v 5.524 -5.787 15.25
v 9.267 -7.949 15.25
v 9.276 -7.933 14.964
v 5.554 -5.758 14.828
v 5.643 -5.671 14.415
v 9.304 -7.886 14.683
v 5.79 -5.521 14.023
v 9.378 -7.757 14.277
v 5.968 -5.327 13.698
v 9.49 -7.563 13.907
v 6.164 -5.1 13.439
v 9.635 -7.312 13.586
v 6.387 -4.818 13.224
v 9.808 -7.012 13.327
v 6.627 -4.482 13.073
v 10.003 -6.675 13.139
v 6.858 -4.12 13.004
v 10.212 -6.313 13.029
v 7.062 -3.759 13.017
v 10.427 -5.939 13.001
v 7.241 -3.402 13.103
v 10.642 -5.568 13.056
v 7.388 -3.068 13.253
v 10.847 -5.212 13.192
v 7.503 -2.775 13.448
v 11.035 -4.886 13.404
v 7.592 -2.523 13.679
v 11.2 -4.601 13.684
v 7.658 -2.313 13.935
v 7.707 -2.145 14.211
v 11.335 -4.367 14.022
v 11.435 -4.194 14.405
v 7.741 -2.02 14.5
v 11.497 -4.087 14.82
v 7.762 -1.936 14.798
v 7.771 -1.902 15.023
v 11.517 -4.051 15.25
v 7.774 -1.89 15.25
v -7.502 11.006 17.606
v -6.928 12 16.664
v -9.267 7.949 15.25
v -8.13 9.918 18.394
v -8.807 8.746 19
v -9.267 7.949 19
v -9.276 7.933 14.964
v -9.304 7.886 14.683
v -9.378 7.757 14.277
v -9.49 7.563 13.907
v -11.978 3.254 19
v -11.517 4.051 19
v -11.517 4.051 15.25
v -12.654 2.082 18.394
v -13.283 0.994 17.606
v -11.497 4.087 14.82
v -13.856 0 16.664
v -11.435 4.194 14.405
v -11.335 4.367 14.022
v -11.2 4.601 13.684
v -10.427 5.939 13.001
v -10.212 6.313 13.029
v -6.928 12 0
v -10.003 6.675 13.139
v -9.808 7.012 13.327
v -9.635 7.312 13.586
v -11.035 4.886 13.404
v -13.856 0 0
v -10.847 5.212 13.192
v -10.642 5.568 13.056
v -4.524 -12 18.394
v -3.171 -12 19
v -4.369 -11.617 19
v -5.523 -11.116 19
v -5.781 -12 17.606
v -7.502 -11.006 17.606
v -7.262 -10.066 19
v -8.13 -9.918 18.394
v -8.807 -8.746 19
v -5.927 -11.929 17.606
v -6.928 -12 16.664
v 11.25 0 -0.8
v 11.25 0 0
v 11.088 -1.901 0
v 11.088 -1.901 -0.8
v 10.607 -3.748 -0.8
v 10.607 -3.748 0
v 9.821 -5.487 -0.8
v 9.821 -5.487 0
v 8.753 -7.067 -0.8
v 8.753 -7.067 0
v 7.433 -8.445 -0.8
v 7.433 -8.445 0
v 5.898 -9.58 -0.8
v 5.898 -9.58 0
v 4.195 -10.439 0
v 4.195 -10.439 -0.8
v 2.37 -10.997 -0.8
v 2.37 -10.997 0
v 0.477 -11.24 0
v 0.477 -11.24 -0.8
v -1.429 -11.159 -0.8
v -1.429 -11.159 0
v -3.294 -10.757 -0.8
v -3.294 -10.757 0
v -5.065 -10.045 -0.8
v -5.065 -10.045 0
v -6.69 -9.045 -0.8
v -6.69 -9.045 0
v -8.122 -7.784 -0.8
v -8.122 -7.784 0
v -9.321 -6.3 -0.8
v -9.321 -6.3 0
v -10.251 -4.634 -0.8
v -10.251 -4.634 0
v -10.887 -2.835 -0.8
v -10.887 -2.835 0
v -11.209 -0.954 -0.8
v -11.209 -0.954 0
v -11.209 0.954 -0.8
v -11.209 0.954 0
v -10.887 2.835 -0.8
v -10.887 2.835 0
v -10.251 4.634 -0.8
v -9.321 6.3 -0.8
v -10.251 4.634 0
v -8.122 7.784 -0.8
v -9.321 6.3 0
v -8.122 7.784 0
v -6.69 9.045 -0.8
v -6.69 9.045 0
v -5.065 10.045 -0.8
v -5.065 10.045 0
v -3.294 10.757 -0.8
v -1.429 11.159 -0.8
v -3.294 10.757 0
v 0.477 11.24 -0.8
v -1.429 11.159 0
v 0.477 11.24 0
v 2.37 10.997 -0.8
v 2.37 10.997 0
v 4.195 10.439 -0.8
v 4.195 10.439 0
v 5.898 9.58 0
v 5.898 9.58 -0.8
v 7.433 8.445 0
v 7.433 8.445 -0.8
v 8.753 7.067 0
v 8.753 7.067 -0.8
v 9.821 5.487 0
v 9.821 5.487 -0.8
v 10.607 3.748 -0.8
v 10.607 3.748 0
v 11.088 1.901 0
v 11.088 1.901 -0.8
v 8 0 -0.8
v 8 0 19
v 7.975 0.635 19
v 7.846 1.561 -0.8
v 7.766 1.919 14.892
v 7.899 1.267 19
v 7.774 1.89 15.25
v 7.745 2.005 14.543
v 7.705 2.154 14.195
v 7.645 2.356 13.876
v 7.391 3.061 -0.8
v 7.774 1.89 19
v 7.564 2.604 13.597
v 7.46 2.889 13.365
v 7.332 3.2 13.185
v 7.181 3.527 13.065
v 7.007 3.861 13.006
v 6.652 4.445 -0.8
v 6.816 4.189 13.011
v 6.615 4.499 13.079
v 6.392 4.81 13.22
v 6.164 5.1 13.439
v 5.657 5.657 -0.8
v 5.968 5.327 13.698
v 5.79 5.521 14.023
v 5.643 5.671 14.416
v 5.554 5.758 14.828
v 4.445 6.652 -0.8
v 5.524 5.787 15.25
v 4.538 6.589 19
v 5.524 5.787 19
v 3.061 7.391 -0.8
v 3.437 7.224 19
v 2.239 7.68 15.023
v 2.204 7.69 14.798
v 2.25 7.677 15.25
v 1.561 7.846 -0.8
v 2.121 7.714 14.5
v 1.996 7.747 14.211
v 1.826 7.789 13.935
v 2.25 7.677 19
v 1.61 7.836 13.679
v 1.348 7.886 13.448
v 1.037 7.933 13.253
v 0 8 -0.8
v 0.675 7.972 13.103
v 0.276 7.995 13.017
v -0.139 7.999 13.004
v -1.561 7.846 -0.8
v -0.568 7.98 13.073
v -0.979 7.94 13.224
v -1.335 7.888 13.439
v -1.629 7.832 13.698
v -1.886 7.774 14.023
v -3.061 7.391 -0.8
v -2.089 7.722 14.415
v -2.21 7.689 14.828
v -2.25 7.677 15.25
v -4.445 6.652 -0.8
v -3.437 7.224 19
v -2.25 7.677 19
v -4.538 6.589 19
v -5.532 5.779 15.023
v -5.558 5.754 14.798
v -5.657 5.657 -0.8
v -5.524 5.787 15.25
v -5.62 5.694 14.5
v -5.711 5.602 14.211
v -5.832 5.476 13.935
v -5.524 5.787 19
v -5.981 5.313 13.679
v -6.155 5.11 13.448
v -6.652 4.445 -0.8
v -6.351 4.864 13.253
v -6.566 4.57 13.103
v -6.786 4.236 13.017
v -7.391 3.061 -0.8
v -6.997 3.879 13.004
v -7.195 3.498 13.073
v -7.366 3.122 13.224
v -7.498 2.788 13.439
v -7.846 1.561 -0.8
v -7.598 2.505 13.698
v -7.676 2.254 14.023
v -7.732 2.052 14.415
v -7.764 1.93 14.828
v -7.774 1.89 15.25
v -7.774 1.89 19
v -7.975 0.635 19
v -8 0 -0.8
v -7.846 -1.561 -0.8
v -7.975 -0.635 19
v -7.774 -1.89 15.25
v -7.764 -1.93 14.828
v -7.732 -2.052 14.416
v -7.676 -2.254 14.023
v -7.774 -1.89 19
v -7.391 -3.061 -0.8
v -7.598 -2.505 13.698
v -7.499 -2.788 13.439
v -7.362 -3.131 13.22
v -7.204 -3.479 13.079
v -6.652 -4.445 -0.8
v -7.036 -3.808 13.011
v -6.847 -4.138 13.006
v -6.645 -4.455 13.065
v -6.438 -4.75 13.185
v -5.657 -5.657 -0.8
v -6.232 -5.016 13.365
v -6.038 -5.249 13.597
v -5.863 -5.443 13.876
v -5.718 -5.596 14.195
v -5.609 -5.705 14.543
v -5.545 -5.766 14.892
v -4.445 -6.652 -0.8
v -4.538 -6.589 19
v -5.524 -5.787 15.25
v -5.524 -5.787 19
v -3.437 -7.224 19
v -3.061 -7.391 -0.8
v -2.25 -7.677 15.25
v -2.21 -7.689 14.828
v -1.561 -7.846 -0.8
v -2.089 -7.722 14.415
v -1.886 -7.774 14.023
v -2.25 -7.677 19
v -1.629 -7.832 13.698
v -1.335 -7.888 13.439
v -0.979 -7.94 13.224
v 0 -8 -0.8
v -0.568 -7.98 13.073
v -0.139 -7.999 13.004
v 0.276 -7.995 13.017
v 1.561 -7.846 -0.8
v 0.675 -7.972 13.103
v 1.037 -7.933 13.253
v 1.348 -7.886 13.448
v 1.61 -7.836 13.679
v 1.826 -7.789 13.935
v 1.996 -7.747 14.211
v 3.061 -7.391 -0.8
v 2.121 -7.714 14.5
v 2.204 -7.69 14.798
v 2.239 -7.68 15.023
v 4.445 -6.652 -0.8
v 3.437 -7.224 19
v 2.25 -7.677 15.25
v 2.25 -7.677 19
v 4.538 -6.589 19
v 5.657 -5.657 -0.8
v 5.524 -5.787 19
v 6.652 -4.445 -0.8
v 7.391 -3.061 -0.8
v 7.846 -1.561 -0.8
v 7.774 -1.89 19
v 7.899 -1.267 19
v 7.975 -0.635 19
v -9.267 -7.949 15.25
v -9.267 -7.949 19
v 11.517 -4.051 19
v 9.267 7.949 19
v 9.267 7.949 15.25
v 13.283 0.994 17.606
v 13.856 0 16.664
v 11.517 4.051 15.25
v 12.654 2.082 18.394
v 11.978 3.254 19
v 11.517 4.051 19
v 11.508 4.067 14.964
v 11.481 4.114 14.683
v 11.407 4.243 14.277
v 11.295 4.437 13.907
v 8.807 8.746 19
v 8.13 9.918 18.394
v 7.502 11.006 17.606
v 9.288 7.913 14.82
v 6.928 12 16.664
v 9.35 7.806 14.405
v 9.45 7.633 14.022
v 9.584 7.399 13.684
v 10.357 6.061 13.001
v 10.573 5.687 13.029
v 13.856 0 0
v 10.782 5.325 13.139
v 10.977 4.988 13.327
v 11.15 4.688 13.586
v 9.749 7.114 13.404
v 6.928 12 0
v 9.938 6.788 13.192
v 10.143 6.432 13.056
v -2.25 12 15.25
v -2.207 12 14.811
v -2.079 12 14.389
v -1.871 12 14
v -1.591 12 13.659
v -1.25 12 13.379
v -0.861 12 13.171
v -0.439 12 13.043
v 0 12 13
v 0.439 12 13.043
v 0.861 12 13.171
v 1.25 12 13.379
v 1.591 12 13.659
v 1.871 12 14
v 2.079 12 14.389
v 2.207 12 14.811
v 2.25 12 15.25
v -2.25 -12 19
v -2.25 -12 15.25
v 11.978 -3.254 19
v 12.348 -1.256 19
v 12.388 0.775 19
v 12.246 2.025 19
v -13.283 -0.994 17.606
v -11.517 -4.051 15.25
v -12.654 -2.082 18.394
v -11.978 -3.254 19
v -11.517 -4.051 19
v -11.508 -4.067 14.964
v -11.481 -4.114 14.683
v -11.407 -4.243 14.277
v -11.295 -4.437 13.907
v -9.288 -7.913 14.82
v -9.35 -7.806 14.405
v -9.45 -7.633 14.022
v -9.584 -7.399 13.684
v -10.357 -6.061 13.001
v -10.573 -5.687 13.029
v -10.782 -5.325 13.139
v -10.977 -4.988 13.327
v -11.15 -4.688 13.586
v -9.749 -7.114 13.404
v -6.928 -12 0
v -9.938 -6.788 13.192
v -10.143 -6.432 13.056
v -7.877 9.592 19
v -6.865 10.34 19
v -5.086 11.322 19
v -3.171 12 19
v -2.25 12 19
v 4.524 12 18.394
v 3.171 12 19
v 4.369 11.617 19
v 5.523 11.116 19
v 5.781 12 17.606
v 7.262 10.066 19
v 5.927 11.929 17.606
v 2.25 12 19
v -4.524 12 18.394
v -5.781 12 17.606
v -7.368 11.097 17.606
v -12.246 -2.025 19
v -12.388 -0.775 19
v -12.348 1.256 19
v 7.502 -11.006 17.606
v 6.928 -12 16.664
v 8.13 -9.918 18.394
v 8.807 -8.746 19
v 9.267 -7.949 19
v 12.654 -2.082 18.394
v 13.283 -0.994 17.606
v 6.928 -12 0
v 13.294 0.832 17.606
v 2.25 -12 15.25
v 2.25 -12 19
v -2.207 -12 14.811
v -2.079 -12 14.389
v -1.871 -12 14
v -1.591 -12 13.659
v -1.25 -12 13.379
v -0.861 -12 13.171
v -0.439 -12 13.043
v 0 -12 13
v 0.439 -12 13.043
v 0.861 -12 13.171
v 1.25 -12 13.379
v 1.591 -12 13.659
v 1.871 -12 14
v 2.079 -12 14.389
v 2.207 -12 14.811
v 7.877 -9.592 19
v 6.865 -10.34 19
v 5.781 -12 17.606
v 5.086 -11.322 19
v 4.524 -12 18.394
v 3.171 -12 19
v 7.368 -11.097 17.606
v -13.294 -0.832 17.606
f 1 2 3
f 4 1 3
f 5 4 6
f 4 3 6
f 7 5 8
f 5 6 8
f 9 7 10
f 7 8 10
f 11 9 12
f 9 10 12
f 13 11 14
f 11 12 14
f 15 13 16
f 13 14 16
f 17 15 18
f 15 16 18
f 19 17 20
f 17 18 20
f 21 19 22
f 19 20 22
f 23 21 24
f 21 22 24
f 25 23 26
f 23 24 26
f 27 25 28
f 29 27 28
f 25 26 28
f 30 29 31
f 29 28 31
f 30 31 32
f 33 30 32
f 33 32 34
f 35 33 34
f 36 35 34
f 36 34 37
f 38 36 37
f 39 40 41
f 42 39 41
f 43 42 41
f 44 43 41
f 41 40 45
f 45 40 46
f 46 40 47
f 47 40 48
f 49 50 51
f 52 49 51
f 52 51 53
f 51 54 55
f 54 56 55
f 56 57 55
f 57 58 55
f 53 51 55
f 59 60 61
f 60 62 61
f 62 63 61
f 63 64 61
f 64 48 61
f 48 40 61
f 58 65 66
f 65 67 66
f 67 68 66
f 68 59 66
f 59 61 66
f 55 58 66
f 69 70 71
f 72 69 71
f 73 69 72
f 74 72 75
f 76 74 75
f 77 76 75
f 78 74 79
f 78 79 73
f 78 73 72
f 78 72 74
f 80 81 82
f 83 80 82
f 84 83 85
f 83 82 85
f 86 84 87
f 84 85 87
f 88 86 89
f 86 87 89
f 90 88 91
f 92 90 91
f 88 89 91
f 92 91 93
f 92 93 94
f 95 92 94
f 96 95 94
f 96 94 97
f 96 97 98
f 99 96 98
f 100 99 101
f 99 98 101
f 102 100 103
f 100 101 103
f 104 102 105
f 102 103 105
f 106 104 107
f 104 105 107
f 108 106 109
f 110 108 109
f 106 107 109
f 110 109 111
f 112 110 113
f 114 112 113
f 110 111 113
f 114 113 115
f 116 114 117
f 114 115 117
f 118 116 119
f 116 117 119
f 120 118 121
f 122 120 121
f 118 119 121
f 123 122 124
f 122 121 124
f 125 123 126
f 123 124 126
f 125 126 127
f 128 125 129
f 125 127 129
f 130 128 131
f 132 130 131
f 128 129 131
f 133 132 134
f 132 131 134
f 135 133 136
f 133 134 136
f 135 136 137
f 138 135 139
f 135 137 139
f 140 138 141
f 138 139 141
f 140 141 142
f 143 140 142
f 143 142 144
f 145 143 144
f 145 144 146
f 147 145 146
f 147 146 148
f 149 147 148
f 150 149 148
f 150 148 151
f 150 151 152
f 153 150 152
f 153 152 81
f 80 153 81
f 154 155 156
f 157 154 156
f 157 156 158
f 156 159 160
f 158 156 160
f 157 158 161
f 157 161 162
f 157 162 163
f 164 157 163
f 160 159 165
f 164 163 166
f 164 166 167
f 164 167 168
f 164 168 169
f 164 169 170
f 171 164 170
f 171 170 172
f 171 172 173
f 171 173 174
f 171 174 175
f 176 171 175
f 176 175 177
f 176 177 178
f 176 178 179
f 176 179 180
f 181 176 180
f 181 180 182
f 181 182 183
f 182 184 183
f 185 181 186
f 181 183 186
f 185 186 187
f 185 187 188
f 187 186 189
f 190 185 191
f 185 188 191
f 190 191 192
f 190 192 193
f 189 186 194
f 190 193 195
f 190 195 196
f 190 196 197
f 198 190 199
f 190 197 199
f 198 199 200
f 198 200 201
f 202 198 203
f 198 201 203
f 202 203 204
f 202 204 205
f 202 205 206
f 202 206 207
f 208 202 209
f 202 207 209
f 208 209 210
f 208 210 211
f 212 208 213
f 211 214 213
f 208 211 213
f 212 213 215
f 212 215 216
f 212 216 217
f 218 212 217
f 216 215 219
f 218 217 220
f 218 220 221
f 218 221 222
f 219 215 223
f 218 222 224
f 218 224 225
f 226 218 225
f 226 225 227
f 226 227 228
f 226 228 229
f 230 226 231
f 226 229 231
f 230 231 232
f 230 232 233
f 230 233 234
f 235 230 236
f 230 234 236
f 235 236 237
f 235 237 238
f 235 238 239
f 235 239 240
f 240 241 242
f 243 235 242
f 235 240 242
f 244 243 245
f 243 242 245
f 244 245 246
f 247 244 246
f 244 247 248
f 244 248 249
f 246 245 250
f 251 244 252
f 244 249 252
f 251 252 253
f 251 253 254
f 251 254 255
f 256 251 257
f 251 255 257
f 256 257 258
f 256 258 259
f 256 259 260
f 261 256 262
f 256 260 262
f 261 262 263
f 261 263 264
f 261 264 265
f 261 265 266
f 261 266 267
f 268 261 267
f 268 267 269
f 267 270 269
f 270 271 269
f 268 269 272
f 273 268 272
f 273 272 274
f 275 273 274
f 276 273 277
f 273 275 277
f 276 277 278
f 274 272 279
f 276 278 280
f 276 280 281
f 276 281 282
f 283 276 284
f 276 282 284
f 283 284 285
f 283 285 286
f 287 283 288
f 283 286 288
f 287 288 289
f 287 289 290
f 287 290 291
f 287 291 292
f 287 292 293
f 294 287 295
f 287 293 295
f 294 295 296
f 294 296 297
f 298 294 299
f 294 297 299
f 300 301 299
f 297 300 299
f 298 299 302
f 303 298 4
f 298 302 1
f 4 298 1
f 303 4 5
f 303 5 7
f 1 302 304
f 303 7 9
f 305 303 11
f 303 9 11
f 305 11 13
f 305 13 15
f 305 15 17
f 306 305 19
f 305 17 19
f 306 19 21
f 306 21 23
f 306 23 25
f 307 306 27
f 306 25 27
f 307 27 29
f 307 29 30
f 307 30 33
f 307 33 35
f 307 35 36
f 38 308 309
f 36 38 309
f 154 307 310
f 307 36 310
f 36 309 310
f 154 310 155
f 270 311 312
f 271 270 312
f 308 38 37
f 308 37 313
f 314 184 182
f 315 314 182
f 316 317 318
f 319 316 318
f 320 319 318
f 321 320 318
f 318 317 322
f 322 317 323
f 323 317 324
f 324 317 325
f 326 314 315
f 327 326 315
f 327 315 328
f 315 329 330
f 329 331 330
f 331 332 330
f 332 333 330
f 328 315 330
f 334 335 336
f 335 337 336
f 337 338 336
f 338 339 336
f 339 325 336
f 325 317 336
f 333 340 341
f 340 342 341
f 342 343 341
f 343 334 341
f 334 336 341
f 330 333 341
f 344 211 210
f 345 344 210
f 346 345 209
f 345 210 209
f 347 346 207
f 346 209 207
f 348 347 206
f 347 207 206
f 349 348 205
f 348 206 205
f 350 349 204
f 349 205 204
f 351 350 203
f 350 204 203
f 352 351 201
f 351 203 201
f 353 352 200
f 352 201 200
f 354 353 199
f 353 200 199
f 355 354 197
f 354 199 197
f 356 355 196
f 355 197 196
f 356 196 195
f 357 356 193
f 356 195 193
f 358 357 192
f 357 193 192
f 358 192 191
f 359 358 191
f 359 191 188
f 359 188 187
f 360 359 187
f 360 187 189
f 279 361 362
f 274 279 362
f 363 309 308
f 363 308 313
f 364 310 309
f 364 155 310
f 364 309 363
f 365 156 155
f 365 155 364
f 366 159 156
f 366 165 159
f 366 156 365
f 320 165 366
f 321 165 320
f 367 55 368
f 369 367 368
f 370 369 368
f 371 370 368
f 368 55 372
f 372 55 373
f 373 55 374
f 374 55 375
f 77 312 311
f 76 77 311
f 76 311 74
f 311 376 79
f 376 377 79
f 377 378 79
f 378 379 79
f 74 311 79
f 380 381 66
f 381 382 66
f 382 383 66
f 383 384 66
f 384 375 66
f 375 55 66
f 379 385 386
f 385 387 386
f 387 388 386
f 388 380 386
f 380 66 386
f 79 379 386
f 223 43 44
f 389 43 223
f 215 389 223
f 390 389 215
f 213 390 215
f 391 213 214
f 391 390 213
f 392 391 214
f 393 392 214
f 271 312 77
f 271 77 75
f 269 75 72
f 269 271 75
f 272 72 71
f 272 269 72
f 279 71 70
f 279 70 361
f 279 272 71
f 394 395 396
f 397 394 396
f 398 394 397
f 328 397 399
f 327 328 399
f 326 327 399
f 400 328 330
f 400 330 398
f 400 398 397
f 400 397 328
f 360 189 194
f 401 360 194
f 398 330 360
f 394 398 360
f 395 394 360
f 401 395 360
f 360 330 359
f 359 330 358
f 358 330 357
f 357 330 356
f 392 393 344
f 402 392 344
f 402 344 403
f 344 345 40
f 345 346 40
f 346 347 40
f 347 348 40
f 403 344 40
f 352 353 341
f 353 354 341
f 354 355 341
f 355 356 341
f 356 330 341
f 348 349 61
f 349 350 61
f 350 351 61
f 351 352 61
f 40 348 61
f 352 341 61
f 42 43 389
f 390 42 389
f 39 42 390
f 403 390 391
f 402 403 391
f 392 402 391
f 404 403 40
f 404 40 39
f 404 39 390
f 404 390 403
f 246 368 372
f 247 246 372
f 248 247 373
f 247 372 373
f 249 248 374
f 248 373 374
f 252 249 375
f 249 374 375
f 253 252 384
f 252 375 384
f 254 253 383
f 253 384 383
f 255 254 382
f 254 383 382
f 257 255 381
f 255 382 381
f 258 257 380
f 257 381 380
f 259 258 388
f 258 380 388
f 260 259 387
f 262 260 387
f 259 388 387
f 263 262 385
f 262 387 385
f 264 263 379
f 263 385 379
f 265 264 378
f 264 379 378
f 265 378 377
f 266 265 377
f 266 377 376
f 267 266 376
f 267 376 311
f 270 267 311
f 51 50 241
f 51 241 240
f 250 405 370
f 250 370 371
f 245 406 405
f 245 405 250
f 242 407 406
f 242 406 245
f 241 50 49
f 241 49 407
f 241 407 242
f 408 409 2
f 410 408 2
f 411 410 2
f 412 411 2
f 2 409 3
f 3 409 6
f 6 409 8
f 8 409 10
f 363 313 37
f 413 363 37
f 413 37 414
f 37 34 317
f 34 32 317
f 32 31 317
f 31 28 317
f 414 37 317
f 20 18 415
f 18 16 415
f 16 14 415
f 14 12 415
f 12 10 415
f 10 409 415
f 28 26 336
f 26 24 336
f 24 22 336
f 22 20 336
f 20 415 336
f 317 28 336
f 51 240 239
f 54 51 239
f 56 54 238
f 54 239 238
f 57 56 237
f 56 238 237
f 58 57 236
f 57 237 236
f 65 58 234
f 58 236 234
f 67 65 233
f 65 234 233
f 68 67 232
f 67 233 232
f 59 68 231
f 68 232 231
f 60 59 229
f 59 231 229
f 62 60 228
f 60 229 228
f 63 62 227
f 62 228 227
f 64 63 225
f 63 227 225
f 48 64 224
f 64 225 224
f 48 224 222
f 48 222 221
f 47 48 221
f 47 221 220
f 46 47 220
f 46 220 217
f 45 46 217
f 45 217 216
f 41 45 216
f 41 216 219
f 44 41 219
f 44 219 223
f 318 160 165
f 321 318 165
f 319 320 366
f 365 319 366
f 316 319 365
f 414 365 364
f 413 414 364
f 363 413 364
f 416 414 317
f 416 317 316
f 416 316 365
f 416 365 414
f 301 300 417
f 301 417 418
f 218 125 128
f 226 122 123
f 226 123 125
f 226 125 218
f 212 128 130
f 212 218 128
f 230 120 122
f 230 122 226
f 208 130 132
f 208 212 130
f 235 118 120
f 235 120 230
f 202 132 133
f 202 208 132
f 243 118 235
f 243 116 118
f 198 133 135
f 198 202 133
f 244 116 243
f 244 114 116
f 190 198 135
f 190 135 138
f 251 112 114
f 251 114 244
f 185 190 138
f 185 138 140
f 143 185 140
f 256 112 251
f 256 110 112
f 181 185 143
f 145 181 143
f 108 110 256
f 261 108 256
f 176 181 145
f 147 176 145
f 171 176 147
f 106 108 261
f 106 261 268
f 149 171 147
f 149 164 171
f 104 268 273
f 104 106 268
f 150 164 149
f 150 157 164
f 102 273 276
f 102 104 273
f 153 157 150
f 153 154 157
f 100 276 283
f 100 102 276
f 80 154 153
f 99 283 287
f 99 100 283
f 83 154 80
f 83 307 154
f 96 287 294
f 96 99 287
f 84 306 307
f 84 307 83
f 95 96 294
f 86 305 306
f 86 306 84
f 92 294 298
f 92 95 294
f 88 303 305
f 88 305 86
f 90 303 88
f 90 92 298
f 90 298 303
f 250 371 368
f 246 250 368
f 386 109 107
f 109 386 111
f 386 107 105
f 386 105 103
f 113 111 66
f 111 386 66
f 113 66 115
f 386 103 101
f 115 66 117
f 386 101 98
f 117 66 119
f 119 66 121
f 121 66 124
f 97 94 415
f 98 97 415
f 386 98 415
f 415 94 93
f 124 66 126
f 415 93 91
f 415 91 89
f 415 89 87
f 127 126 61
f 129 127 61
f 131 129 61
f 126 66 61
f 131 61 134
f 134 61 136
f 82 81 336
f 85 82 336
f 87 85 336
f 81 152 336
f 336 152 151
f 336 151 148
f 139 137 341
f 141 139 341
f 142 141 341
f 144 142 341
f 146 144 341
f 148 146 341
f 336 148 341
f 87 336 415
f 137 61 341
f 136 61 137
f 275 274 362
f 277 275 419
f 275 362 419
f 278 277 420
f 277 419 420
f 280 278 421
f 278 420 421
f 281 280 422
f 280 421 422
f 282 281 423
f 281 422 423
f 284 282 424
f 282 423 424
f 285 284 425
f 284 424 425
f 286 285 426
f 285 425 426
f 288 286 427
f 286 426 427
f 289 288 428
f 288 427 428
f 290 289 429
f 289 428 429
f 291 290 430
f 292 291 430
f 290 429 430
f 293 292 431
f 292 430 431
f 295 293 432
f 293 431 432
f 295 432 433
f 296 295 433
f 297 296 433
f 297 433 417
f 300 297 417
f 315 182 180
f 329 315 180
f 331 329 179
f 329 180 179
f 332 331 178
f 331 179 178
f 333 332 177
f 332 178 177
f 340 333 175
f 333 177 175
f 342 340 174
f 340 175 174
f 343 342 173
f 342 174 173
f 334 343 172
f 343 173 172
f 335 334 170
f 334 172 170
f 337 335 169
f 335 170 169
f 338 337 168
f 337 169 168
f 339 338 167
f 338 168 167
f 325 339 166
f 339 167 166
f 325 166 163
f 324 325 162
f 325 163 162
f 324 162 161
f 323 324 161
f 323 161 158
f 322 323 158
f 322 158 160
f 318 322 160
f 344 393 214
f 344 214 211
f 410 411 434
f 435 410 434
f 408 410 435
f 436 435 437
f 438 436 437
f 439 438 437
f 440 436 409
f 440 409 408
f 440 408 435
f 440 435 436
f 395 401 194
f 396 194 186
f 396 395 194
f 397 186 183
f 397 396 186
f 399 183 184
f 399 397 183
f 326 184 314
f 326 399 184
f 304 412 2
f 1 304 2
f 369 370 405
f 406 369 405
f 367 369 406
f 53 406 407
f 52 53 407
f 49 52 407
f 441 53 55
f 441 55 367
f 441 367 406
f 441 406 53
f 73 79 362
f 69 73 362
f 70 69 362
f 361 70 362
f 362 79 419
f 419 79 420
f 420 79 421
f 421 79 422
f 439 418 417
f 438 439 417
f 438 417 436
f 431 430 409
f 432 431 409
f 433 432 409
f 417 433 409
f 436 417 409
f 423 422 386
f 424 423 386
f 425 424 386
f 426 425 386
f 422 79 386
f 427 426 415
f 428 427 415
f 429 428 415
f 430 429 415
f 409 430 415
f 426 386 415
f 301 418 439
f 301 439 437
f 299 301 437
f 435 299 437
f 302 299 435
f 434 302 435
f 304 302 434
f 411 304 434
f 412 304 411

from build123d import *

# Parameters (mm, degrees)
F1_DEPTH  = 19
F2_R      = 11.25
F3_DEPTH  = 0.8
F4_R      = 8
F5_DEPTH  = 17
F7_DEPTH  = 25
F9_DEPTH  = 25
F11_DEPTH = 30.05913
F14_R     = 8
F15_DEPTH = 25


with BuildPart() as f1:
    # F0 (on Top) → F1 (new body)
    with BuildSketch(Plane.XY):
        Polygon((0, -12), (0, 0), (0, 12), (-6.928203, 12), (-13.856406, 0), (-6.928203, -12), align=None)
        Polygon((0, 12), (0, 0), (0, -12), (6.928203, -12), (13.856406, 0), (6.928203, 12), align=None)
    extrude(amount=F1_DEPTH)

    # F2 (on face) → F3 (join)
    with BuildSketch(Plane(origin=(0, 0, 0), x_dir=(1, 0, 0), z_dir=(0, 0, -1))):
        Circle(F2_R)
    extrude(amount=F3_DEPTH)

    # F4 (on face) → F5 (cut)
    with BuildSketch(Plane.XY.offset(19)):
        Circle(F4_R)
    extrude(amount=-F5_DEPTH, mode=Mode.SUBTRACT)

    # F6 (on face) → F7 (cut)
    with BuildSketch(Plane(origin=(10.392305, -6, 0), x_dir=(0.5, 0.866025, 0), z_dir=(0.866025, -0.5, 0))):
        with BuildLine():
            Line((0, 19), (-2.25, 19))
            Line((-2.25, 19), (-2.25, 15.25))
            ThreePointArc((-2.25, 15.25), (0, 13), (2.25, 15.25))
            Line((2.25, 15.25), (2.25, 19))
            Line((2.25, 19), (0, 19))
        make_face()
    extrude(amount=-F7_DEPTH, mode=Mode.SUBTRACT)

    # F8 (on face) → F9 (cut)
    with BuildSketch(Plane(origin=(-10.392305, -6, 0), x_dir=(0.5, -0.866025, 0), z_dir=(-0.866025, -0.5, 0))):
        with BuildLine():
            Line((2.25, 19), (0, 19))
            Line((0, 19), (-2.25, 19))
            Line((-2.25, 19), (-2.25, 15.25))
            ThreePointArc((-2.25, 15.25), (0, 13), (2.25, 15.25))
            Line((2.25, 15.25), (2.25, 19))
        make_face()
    extrude(amount=-F9_DEPTH, mode=Mode.SUBTRACT)

    # F10 (on face) → F11 (cut)
    with BuildSketch(Plane.XZ.offset(12)):
        with BuildLine():
            ThreePointArc((-2.25, 15.25), (0, 13), (2.25, 15.25))
            Line((2.25, 15.25), (2.25, 19))
            Line((2.25, 19), (0, 19))
            Line((0, 19), (-2.25, 19))
            Line((-2.25, 19), (-2.25, 15.25))
        make_face()
    extrude(amount=-F11_DEPTH, mode=Mode.SUBTRACT)

    # F12 (on Front) → F13 (revolve, cut)
    with BuildSketch(Plane.XZ):
        with BuildLine():
            ThreePointArc((8.079038, 23.642426), (13.284742, 17.664152), (16.167056, 10.279615))
            Line((16.167056, 10.279615), (18.863061, 27.862262))
            Line((18.863061, 27.862262), (8.079038, 23.642426))
        make_face()
    revolve(axis=Axis((0, 0, -20.240964), (0, 0, -1)), mode=Mode.SUBTRACT)

    # F14 (on face) → F15 (cut)
    with BuildSketch(Plane(origin=(0, 0, -0.8), x_dir=(1, 0, 0), z_dir=(0, 0, -1))):
        Circle(F14_R)
    extrude(amount=-F15_DEPTH, mode=Mode.SUBTRACT)


solid = f1.part
